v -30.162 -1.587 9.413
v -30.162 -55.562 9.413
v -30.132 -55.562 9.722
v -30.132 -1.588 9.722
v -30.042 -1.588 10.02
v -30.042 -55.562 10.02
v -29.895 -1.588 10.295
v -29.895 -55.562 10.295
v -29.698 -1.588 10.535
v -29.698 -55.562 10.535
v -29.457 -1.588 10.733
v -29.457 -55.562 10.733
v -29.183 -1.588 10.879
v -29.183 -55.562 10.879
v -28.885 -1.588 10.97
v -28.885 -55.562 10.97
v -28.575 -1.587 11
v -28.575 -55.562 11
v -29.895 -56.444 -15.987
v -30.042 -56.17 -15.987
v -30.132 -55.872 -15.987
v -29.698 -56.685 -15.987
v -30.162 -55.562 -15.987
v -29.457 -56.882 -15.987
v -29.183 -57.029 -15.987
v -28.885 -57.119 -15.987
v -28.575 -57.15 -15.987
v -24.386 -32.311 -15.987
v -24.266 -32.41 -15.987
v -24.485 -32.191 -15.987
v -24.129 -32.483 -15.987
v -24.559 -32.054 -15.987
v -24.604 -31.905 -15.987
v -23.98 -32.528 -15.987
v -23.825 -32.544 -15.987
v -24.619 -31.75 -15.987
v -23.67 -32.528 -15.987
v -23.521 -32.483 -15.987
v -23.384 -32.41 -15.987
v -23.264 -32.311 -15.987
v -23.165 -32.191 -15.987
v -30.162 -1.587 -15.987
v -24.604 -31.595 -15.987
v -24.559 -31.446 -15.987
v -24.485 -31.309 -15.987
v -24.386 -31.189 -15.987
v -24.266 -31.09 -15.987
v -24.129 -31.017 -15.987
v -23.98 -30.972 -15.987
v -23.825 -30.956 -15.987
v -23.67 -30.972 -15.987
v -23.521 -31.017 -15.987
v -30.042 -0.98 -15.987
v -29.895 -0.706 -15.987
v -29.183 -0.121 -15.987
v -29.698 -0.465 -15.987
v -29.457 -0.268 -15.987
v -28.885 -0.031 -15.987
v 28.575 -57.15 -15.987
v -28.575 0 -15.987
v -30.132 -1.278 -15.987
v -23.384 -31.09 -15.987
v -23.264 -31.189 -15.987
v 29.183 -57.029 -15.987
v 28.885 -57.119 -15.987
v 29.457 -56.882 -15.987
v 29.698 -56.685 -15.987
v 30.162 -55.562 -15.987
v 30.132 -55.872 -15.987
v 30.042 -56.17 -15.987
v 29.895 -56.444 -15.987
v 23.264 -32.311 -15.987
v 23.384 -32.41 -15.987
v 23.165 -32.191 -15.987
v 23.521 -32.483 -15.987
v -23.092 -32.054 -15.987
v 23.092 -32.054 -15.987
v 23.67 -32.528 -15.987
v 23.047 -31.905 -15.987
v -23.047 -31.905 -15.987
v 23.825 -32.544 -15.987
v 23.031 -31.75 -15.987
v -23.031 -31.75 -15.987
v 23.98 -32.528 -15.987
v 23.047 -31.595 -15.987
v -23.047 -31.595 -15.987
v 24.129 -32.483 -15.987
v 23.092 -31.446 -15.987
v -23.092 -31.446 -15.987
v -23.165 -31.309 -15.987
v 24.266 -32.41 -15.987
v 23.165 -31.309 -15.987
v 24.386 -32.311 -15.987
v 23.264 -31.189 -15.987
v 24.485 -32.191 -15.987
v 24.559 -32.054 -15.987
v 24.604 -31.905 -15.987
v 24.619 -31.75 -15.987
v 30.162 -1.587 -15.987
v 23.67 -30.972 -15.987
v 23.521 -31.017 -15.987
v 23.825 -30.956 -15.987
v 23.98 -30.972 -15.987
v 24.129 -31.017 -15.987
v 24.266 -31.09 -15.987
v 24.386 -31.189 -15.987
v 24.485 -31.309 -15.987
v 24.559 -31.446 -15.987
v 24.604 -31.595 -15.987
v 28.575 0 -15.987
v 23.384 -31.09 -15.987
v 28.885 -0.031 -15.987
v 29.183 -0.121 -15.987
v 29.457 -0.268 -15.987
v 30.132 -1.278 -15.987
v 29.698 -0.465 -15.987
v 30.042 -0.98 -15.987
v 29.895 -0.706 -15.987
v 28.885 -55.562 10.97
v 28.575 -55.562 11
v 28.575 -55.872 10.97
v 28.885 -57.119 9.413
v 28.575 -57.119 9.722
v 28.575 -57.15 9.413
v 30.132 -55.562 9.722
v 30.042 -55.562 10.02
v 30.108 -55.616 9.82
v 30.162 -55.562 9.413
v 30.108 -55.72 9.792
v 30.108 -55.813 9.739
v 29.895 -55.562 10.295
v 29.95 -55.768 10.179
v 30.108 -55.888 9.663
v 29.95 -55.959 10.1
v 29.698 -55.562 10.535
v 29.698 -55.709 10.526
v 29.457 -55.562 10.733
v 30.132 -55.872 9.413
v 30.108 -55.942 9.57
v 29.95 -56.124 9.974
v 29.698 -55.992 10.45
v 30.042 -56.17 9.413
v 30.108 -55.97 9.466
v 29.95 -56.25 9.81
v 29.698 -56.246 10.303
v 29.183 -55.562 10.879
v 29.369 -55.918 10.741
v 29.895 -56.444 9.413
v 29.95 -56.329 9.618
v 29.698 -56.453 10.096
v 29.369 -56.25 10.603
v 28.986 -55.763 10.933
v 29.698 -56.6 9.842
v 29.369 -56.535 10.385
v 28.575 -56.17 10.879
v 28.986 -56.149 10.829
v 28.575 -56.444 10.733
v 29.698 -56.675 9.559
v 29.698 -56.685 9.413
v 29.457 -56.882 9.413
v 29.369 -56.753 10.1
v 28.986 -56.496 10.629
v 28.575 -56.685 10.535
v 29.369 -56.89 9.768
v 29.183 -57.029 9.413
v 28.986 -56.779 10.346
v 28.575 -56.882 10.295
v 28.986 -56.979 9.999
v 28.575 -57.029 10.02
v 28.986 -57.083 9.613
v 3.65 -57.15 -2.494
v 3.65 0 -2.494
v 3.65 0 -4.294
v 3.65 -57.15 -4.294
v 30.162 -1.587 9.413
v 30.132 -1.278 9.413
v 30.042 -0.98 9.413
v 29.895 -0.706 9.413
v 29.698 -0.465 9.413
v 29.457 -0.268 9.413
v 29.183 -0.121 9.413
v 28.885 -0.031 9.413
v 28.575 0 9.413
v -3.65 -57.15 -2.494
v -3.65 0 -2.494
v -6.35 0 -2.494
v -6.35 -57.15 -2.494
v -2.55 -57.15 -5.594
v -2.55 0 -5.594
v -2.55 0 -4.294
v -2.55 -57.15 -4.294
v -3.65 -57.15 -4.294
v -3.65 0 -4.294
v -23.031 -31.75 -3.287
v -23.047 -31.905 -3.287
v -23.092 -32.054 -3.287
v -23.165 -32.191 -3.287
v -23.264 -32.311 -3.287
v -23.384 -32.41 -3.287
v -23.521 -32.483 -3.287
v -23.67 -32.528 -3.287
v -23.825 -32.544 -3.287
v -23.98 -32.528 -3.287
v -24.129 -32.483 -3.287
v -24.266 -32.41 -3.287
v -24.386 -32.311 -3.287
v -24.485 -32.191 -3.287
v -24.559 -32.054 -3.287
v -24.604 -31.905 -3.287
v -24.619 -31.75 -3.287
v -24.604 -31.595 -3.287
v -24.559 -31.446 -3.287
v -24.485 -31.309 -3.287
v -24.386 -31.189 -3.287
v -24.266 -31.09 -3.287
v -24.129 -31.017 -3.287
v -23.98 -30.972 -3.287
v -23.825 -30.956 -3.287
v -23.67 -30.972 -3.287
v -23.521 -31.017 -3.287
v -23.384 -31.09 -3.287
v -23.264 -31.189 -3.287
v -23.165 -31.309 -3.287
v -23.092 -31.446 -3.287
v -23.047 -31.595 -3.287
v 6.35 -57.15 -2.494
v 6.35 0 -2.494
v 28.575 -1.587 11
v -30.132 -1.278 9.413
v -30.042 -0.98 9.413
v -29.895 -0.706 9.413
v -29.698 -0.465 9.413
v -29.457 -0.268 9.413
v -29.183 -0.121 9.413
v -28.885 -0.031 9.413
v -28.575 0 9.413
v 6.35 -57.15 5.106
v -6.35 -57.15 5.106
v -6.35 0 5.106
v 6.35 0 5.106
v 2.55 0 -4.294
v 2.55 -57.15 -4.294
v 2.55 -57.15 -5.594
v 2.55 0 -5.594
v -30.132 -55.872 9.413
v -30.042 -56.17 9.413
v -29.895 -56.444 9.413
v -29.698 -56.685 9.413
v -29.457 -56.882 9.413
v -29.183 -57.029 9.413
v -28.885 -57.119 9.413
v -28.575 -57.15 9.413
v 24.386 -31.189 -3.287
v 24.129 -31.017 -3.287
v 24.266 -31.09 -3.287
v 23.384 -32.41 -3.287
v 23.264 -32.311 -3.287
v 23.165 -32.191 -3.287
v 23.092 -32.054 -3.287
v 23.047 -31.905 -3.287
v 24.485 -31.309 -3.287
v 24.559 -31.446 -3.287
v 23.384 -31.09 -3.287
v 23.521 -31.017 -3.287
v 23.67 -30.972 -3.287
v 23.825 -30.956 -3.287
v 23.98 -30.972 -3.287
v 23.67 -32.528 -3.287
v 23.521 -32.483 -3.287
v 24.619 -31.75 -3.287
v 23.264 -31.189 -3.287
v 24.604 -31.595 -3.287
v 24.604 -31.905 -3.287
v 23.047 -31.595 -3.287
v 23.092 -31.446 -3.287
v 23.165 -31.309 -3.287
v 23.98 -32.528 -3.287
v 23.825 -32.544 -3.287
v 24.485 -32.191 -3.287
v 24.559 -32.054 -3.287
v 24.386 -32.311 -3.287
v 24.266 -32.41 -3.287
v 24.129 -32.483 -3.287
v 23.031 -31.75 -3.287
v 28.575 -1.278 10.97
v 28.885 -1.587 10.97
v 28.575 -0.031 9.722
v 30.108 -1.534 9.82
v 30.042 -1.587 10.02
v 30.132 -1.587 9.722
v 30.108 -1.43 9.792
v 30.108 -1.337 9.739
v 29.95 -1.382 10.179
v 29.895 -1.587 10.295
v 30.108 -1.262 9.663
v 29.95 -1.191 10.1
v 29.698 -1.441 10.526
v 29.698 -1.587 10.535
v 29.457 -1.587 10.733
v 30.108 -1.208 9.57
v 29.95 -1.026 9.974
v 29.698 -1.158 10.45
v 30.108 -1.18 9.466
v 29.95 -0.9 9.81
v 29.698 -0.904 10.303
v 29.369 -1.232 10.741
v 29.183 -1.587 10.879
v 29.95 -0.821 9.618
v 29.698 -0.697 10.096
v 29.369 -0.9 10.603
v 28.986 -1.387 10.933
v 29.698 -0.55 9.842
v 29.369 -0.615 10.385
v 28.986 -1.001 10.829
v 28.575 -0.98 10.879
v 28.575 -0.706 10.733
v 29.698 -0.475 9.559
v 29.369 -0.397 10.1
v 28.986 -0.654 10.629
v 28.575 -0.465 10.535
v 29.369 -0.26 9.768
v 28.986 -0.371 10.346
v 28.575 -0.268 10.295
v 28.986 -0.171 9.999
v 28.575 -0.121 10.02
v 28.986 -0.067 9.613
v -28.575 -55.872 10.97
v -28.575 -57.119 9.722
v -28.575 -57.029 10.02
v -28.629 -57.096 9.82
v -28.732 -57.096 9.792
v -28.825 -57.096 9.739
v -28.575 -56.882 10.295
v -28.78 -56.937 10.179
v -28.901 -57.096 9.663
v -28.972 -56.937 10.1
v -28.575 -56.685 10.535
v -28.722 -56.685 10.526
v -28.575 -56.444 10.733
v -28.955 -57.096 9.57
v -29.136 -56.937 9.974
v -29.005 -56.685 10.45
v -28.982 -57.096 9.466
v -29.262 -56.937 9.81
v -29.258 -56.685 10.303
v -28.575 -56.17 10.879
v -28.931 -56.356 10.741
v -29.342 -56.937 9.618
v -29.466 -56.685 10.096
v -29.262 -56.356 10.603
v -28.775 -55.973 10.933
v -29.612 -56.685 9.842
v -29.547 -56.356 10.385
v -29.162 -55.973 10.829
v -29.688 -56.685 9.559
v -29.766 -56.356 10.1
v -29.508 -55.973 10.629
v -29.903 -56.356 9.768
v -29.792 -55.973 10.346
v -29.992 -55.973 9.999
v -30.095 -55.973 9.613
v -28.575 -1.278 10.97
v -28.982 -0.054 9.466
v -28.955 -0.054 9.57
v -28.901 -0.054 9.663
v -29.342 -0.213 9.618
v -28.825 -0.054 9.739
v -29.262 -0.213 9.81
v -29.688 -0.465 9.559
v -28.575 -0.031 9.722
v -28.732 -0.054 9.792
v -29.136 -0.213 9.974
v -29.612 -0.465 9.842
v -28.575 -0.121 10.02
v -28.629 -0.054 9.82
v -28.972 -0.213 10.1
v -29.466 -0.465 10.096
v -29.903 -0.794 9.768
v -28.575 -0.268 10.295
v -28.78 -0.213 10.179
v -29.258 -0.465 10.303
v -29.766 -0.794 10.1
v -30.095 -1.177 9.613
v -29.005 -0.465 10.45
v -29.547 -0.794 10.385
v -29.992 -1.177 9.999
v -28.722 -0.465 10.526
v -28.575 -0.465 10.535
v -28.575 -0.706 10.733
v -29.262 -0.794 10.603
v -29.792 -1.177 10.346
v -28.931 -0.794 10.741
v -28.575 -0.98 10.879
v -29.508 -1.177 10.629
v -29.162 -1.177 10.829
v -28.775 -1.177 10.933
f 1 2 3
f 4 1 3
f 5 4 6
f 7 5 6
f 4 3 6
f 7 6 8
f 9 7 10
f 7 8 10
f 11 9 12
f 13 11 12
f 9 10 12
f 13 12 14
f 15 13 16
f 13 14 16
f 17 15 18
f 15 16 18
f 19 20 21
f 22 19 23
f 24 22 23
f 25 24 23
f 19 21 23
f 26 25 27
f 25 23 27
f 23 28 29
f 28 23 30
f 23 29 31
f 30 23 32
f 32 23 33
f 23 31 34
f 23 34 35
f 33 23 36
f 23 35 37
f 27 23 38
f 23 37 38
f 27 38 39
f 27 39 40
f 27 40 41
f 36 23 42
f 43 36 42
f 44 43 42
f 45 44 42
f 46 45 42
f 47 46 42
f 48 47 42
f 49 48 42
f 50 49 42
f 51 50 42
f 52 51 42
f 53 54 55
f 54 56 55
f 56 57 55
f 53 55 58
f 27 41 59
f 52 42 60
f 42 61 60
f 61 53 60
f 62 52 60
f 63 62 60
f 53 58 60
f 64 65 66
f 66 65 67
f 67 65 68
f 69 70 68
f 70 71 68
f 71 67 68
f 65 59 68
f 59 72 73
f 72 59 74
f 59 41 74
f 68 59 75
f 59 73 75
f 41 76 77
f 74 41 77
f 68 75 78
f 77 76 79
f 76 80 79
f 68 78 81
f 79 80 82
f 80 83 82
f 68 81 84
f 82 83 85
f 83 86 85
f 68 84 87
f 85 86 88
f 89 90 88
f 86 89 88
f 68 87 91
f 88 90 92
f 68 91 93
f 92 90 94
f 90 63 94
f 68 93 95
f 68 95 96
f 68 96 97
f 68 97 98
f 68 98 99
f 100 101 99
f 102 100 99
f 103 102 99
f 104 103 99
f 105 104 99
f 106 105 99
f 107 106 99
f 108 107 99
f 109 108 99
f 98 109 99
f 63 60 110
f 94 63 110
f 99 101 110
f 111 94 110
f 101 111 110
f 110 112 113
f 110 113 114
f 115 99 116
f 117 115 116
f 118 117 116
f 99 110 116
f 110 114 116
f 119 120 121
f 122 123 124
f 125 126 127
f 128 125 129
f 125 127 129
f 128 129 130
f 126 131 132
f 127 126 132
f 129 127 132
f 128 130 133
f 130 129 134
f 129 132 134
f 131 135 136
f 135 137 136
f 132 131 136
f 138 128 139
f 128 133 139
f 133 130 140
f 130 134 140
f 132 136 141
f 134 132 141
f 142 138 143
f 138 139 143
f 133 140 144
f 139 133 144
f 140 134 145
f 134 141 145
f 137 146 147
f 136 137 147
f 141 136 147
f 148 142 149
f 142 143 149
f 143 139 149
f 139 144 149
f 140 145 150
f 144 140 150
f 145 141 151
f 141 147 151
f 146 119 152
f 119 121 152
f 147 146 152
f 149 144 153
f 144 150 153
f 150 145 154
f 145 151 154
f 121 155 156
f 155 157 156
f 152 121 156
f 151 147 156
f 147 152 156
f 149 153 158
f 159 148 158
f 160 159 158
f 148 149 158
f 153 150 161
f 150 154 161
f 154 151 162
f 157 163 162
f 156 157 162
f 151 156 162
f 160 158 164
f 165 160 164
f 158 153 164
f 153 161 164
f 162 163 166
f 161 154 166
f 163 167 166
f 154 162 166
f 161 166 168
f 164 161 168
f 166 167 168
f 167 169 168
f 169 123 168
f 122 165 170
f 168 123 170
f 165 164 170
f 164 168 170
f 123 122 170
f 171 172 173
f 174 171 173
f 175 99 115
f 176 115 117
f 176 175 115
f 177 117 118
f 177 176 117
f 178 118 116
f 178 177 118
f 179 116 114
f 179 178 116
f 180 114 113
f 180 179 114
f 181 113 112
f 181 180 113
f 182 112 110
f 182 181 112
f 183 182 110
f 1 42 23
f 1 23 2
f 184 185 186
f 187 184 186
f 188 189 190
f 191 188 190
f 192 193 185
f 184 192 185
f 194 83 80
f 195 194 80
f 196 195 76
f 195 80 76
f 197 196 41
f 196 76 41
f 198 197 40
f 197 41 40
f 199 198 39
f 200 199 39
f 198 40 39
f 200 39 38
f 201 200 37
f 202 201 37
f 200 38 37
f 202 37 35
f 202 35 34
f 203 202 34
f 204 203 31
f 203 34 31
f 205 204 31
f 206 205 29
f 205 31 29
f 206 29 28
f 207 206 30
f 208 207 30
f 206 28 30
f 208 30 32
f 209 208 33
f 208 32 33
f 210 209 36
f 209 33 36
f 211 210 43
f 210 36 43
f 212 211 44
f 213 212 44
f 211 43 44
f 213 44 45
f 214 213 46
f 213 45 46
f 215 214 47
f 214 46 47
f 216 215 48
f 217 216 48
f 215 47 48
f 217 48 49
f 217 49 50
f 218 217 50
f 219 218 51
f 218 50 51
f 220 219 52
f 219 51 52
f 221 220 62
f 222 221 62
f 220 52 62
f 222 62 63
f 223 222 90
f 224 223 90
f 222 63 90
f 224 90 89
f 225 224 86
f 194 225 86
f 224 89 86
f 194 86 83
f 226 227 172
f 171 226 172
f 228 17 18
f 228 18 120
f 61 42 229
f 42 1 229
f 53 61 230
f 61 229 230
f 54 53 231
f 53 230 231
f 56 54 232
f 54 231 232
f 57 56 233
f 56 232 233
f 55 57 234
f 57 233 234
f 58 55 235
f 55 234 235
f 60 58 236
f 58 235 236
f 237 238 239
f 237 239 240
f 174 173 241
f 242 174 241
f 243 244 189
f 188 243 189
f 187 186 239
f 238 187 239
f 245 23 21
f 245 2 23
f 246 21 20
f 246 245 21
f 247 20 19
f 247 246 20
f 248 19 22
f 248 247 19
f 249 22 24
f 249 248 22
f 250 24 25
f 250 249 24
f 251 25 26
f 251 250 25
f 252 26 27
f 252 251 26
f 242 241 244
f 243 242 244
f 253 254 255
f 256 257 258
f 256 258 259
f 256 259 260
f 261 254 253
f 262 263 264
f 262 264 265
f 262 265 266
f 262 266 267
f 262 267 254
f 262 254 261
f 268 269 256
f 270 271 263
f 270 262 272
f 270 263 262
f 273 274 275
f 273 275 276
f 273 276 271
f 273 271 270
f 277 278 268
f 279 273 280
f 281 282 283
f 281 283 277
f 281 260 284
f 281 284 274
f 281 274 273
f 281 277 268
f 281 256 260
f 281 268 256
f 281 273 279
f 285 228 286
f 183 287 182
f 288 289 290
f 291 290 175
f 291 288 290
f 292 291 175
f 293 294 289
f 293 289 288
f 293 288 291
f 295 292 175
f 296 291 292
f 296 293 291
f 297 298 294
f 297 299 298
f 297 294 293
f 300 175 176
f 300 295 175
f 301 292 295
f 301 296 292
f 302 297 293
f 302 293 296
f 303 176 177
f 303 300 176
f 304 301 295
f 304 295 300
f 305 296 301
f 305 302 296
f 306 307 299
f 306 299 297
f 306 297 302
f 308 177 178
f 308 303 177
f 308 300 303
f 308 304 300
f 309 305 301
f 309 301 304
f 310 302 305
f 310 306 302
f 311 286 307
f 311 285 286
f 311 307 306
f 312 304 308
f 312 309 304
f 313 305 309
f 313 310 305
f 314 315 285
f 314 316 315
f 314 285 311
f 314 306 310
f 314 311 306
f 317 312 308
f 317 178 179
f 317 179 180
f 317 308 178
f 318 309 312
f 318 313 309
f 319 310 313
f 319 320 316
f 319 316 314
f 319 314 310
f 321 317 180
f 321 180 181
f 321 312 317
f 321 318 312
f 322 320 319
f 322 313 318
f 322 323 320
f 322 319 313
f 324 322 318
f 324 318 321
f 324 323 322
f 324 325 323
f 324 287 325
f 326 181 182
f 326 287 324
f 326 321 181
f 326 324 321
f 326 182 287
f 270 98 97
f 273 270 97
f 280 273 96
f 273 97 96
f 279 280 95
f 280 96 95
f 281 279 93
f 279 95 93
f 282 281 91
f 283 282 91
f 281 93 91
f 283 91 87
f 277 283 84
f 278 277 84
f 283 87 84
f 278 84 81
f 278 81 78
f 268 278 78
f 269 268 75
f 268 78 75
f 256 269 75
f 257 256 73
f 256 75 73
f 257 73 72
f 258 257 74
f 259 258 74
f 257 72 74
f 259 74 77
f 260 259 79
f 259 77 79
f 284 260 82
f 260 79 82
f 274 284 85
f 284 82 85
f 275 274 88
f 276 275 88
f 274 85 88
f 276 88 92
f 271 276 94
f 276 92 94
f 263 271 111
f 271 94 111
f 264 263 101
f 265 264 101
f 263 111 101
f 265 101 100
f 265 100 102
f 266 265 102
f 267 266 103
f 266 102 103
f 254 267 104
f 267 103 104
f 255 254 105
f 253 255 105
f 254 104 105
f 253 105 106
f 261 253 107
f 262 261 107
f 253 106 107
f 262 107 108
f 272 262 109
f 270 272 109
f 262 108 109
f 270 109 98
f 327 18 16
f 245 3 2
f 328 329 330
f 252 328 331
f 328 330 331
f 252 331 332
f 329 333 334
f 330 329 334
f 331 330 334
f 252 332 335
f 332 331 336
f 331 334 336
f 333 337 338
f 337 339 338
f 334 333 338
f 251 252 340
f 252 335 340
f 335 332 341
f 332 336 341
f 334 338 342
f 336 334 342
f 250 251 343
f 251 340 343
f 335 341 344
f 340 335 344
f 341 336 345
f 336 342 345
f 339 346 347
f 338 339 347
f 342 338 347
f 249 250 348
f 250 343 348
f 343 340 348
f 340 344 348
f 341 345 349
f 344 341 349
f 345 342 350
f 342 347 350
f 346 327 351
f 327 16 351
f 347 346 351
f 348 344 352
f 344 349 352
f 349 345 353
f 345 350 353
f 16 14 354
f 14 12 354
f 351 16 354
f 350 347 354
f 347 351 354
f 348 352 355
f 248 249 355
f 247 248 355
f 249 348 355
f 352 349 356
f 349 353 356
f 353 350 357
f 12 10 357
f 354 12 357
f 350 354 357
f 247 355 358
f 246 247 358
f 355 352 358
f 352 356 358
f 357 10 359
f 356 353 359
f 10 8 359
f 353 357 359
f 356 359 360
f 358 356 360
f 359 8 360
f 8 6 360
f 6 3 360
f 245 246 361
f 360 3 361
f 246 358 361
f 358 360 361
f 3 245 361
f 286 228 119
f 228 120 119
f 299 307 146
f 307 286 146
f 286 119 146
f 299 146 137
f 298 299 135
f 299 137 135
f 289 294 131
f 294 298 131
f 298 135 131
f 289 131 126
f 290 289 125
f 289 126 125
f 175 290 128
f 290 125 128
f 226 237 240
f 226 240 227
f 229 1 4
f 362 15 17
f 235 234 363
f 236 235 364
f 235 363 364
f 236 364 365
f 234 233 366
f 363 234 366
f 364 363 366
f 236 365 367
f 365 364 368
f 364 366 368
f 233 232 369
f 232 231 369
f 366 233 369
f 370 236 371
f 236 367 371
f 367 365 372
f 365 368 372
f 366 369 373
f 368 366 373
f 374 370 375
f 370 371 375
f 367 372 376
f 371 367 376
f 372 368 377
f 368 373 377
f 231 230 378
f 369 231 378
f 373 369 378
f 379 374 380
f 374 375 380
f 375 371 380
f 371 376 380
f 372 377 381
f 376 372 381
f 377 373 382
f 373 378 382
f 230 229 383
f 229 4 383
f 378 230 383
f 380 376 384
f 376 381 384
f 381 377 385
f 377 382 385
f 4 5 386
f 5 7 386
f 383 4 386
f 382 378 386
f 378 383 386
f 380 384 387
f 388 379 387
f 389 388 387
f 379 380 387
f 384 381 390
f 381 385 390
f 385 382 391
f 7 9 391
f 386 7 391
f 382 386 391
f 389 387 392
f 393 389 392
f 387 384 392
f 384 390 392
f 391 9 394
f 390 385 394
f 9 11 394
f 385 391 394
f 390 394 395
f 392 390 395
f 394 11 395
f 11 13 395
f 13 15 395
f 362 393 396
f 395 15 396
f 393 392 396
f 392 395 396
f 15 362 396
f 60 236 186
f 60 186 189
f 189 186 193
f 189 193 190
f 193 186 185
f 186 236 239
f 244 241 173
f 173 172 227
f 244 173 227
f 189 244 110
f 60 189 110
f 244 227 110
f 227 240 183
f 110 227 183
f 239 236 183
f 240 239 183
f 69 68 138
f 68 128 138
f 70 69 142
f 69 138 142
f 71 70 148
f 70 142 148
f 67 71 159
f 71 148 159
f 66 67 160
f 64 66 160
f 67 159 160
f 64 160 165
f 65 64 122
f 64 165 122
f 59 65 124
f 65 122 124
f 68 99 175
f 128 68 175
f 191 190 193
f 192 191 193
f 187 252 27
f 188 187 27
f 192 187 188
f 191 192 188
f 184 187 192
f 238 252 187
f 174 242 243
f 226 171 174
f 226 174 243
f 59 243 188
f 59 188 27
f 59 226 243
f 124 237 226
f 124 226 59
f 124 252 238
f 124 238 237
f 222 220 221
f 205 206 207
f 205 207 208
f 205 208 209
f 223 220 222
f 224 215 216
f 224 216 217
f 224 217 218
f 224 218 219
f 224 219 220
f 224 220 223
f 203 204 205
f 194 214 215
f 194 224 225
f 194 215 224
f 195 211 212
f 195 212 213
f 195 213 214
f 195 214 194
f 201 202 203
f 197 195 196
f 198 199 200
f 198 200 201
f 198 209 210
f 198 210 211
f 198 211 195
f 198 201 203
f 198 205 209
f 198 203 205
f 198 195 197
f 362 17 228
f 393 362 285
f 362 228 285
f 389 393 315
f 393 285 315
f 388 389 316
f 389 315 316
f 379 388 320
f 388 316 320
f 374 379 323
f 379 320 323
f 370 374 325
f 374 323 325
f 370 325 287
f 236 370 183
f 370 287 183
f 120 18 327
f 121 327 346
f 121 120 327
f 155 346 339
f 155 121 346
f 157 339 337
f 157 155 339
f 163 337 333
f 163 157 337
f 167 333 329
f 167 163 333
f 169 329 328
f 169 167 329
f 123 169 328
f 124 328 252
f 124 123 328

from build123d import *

# Parameters (mm, degrees)
F0_W     = 60.325
F0_H     = 26.9875
F1_DEPTH = 57.15
F2_R     = 1.5875
F3_R     = 0.79375
F4_DEPTH = 12.7


with BuildPart() as f1:
    # F0 (on Front) → F1 (new body)
    with BuildSketch(Plane.XZ):
        with Locations((0, -2.493597)):
            Rectangle(F0_W, F0_H)
        Polygon((-6.35, 5.106403), (6.35, 5.106403), (6.35, -2.493597), (3.65, -2.493597), (3.65, -4.293597), (2.55, -4.293597), (2.55, -5.593597), (-2.55, -5.593597), (-2.55, -4.293597), (-3.65, -4.293597), (-3.65, -2.493597), (-6.35, -2.493597), align=None, mode=Mode.SUBTRACT)
    extrude(amount=F1_DEPTH)

    # F2
    f2_edges = [f1.edges().sort_by_distance(p)[0] for p in [
        (-30.1625, -28.575, 11.000153),
        (0, -57.15, 11.000153),
        (-30.1625, -57.15, -2.493597),
        (-30.1625, 0, -2.493597),
        (0, 0, 11.000153),
        (30.1625, -28.575, 11.000153),
        (30.1625, 0, -2.493597),
        (30.1625, -57.15, -2.493597),
    ]]
    fillet(f2_edges, radius=F2_R)

    # F3 (on face) → F4 (cut)
    with BuildSketch(Plane(origin=(0, 0, -15.987347), x_dir=(1, 0, 0), z_dir=(0, 0, -1))):
        with Locations((23.8252, 31.75)):
            Circle(F3_R)
        with Locations((-23.8252, 31.75)):
            Circle(F3_R)
    extrude(amount=-F4_DEPTH, mode=Mode.SUBTRACT)


solid = f1.part
